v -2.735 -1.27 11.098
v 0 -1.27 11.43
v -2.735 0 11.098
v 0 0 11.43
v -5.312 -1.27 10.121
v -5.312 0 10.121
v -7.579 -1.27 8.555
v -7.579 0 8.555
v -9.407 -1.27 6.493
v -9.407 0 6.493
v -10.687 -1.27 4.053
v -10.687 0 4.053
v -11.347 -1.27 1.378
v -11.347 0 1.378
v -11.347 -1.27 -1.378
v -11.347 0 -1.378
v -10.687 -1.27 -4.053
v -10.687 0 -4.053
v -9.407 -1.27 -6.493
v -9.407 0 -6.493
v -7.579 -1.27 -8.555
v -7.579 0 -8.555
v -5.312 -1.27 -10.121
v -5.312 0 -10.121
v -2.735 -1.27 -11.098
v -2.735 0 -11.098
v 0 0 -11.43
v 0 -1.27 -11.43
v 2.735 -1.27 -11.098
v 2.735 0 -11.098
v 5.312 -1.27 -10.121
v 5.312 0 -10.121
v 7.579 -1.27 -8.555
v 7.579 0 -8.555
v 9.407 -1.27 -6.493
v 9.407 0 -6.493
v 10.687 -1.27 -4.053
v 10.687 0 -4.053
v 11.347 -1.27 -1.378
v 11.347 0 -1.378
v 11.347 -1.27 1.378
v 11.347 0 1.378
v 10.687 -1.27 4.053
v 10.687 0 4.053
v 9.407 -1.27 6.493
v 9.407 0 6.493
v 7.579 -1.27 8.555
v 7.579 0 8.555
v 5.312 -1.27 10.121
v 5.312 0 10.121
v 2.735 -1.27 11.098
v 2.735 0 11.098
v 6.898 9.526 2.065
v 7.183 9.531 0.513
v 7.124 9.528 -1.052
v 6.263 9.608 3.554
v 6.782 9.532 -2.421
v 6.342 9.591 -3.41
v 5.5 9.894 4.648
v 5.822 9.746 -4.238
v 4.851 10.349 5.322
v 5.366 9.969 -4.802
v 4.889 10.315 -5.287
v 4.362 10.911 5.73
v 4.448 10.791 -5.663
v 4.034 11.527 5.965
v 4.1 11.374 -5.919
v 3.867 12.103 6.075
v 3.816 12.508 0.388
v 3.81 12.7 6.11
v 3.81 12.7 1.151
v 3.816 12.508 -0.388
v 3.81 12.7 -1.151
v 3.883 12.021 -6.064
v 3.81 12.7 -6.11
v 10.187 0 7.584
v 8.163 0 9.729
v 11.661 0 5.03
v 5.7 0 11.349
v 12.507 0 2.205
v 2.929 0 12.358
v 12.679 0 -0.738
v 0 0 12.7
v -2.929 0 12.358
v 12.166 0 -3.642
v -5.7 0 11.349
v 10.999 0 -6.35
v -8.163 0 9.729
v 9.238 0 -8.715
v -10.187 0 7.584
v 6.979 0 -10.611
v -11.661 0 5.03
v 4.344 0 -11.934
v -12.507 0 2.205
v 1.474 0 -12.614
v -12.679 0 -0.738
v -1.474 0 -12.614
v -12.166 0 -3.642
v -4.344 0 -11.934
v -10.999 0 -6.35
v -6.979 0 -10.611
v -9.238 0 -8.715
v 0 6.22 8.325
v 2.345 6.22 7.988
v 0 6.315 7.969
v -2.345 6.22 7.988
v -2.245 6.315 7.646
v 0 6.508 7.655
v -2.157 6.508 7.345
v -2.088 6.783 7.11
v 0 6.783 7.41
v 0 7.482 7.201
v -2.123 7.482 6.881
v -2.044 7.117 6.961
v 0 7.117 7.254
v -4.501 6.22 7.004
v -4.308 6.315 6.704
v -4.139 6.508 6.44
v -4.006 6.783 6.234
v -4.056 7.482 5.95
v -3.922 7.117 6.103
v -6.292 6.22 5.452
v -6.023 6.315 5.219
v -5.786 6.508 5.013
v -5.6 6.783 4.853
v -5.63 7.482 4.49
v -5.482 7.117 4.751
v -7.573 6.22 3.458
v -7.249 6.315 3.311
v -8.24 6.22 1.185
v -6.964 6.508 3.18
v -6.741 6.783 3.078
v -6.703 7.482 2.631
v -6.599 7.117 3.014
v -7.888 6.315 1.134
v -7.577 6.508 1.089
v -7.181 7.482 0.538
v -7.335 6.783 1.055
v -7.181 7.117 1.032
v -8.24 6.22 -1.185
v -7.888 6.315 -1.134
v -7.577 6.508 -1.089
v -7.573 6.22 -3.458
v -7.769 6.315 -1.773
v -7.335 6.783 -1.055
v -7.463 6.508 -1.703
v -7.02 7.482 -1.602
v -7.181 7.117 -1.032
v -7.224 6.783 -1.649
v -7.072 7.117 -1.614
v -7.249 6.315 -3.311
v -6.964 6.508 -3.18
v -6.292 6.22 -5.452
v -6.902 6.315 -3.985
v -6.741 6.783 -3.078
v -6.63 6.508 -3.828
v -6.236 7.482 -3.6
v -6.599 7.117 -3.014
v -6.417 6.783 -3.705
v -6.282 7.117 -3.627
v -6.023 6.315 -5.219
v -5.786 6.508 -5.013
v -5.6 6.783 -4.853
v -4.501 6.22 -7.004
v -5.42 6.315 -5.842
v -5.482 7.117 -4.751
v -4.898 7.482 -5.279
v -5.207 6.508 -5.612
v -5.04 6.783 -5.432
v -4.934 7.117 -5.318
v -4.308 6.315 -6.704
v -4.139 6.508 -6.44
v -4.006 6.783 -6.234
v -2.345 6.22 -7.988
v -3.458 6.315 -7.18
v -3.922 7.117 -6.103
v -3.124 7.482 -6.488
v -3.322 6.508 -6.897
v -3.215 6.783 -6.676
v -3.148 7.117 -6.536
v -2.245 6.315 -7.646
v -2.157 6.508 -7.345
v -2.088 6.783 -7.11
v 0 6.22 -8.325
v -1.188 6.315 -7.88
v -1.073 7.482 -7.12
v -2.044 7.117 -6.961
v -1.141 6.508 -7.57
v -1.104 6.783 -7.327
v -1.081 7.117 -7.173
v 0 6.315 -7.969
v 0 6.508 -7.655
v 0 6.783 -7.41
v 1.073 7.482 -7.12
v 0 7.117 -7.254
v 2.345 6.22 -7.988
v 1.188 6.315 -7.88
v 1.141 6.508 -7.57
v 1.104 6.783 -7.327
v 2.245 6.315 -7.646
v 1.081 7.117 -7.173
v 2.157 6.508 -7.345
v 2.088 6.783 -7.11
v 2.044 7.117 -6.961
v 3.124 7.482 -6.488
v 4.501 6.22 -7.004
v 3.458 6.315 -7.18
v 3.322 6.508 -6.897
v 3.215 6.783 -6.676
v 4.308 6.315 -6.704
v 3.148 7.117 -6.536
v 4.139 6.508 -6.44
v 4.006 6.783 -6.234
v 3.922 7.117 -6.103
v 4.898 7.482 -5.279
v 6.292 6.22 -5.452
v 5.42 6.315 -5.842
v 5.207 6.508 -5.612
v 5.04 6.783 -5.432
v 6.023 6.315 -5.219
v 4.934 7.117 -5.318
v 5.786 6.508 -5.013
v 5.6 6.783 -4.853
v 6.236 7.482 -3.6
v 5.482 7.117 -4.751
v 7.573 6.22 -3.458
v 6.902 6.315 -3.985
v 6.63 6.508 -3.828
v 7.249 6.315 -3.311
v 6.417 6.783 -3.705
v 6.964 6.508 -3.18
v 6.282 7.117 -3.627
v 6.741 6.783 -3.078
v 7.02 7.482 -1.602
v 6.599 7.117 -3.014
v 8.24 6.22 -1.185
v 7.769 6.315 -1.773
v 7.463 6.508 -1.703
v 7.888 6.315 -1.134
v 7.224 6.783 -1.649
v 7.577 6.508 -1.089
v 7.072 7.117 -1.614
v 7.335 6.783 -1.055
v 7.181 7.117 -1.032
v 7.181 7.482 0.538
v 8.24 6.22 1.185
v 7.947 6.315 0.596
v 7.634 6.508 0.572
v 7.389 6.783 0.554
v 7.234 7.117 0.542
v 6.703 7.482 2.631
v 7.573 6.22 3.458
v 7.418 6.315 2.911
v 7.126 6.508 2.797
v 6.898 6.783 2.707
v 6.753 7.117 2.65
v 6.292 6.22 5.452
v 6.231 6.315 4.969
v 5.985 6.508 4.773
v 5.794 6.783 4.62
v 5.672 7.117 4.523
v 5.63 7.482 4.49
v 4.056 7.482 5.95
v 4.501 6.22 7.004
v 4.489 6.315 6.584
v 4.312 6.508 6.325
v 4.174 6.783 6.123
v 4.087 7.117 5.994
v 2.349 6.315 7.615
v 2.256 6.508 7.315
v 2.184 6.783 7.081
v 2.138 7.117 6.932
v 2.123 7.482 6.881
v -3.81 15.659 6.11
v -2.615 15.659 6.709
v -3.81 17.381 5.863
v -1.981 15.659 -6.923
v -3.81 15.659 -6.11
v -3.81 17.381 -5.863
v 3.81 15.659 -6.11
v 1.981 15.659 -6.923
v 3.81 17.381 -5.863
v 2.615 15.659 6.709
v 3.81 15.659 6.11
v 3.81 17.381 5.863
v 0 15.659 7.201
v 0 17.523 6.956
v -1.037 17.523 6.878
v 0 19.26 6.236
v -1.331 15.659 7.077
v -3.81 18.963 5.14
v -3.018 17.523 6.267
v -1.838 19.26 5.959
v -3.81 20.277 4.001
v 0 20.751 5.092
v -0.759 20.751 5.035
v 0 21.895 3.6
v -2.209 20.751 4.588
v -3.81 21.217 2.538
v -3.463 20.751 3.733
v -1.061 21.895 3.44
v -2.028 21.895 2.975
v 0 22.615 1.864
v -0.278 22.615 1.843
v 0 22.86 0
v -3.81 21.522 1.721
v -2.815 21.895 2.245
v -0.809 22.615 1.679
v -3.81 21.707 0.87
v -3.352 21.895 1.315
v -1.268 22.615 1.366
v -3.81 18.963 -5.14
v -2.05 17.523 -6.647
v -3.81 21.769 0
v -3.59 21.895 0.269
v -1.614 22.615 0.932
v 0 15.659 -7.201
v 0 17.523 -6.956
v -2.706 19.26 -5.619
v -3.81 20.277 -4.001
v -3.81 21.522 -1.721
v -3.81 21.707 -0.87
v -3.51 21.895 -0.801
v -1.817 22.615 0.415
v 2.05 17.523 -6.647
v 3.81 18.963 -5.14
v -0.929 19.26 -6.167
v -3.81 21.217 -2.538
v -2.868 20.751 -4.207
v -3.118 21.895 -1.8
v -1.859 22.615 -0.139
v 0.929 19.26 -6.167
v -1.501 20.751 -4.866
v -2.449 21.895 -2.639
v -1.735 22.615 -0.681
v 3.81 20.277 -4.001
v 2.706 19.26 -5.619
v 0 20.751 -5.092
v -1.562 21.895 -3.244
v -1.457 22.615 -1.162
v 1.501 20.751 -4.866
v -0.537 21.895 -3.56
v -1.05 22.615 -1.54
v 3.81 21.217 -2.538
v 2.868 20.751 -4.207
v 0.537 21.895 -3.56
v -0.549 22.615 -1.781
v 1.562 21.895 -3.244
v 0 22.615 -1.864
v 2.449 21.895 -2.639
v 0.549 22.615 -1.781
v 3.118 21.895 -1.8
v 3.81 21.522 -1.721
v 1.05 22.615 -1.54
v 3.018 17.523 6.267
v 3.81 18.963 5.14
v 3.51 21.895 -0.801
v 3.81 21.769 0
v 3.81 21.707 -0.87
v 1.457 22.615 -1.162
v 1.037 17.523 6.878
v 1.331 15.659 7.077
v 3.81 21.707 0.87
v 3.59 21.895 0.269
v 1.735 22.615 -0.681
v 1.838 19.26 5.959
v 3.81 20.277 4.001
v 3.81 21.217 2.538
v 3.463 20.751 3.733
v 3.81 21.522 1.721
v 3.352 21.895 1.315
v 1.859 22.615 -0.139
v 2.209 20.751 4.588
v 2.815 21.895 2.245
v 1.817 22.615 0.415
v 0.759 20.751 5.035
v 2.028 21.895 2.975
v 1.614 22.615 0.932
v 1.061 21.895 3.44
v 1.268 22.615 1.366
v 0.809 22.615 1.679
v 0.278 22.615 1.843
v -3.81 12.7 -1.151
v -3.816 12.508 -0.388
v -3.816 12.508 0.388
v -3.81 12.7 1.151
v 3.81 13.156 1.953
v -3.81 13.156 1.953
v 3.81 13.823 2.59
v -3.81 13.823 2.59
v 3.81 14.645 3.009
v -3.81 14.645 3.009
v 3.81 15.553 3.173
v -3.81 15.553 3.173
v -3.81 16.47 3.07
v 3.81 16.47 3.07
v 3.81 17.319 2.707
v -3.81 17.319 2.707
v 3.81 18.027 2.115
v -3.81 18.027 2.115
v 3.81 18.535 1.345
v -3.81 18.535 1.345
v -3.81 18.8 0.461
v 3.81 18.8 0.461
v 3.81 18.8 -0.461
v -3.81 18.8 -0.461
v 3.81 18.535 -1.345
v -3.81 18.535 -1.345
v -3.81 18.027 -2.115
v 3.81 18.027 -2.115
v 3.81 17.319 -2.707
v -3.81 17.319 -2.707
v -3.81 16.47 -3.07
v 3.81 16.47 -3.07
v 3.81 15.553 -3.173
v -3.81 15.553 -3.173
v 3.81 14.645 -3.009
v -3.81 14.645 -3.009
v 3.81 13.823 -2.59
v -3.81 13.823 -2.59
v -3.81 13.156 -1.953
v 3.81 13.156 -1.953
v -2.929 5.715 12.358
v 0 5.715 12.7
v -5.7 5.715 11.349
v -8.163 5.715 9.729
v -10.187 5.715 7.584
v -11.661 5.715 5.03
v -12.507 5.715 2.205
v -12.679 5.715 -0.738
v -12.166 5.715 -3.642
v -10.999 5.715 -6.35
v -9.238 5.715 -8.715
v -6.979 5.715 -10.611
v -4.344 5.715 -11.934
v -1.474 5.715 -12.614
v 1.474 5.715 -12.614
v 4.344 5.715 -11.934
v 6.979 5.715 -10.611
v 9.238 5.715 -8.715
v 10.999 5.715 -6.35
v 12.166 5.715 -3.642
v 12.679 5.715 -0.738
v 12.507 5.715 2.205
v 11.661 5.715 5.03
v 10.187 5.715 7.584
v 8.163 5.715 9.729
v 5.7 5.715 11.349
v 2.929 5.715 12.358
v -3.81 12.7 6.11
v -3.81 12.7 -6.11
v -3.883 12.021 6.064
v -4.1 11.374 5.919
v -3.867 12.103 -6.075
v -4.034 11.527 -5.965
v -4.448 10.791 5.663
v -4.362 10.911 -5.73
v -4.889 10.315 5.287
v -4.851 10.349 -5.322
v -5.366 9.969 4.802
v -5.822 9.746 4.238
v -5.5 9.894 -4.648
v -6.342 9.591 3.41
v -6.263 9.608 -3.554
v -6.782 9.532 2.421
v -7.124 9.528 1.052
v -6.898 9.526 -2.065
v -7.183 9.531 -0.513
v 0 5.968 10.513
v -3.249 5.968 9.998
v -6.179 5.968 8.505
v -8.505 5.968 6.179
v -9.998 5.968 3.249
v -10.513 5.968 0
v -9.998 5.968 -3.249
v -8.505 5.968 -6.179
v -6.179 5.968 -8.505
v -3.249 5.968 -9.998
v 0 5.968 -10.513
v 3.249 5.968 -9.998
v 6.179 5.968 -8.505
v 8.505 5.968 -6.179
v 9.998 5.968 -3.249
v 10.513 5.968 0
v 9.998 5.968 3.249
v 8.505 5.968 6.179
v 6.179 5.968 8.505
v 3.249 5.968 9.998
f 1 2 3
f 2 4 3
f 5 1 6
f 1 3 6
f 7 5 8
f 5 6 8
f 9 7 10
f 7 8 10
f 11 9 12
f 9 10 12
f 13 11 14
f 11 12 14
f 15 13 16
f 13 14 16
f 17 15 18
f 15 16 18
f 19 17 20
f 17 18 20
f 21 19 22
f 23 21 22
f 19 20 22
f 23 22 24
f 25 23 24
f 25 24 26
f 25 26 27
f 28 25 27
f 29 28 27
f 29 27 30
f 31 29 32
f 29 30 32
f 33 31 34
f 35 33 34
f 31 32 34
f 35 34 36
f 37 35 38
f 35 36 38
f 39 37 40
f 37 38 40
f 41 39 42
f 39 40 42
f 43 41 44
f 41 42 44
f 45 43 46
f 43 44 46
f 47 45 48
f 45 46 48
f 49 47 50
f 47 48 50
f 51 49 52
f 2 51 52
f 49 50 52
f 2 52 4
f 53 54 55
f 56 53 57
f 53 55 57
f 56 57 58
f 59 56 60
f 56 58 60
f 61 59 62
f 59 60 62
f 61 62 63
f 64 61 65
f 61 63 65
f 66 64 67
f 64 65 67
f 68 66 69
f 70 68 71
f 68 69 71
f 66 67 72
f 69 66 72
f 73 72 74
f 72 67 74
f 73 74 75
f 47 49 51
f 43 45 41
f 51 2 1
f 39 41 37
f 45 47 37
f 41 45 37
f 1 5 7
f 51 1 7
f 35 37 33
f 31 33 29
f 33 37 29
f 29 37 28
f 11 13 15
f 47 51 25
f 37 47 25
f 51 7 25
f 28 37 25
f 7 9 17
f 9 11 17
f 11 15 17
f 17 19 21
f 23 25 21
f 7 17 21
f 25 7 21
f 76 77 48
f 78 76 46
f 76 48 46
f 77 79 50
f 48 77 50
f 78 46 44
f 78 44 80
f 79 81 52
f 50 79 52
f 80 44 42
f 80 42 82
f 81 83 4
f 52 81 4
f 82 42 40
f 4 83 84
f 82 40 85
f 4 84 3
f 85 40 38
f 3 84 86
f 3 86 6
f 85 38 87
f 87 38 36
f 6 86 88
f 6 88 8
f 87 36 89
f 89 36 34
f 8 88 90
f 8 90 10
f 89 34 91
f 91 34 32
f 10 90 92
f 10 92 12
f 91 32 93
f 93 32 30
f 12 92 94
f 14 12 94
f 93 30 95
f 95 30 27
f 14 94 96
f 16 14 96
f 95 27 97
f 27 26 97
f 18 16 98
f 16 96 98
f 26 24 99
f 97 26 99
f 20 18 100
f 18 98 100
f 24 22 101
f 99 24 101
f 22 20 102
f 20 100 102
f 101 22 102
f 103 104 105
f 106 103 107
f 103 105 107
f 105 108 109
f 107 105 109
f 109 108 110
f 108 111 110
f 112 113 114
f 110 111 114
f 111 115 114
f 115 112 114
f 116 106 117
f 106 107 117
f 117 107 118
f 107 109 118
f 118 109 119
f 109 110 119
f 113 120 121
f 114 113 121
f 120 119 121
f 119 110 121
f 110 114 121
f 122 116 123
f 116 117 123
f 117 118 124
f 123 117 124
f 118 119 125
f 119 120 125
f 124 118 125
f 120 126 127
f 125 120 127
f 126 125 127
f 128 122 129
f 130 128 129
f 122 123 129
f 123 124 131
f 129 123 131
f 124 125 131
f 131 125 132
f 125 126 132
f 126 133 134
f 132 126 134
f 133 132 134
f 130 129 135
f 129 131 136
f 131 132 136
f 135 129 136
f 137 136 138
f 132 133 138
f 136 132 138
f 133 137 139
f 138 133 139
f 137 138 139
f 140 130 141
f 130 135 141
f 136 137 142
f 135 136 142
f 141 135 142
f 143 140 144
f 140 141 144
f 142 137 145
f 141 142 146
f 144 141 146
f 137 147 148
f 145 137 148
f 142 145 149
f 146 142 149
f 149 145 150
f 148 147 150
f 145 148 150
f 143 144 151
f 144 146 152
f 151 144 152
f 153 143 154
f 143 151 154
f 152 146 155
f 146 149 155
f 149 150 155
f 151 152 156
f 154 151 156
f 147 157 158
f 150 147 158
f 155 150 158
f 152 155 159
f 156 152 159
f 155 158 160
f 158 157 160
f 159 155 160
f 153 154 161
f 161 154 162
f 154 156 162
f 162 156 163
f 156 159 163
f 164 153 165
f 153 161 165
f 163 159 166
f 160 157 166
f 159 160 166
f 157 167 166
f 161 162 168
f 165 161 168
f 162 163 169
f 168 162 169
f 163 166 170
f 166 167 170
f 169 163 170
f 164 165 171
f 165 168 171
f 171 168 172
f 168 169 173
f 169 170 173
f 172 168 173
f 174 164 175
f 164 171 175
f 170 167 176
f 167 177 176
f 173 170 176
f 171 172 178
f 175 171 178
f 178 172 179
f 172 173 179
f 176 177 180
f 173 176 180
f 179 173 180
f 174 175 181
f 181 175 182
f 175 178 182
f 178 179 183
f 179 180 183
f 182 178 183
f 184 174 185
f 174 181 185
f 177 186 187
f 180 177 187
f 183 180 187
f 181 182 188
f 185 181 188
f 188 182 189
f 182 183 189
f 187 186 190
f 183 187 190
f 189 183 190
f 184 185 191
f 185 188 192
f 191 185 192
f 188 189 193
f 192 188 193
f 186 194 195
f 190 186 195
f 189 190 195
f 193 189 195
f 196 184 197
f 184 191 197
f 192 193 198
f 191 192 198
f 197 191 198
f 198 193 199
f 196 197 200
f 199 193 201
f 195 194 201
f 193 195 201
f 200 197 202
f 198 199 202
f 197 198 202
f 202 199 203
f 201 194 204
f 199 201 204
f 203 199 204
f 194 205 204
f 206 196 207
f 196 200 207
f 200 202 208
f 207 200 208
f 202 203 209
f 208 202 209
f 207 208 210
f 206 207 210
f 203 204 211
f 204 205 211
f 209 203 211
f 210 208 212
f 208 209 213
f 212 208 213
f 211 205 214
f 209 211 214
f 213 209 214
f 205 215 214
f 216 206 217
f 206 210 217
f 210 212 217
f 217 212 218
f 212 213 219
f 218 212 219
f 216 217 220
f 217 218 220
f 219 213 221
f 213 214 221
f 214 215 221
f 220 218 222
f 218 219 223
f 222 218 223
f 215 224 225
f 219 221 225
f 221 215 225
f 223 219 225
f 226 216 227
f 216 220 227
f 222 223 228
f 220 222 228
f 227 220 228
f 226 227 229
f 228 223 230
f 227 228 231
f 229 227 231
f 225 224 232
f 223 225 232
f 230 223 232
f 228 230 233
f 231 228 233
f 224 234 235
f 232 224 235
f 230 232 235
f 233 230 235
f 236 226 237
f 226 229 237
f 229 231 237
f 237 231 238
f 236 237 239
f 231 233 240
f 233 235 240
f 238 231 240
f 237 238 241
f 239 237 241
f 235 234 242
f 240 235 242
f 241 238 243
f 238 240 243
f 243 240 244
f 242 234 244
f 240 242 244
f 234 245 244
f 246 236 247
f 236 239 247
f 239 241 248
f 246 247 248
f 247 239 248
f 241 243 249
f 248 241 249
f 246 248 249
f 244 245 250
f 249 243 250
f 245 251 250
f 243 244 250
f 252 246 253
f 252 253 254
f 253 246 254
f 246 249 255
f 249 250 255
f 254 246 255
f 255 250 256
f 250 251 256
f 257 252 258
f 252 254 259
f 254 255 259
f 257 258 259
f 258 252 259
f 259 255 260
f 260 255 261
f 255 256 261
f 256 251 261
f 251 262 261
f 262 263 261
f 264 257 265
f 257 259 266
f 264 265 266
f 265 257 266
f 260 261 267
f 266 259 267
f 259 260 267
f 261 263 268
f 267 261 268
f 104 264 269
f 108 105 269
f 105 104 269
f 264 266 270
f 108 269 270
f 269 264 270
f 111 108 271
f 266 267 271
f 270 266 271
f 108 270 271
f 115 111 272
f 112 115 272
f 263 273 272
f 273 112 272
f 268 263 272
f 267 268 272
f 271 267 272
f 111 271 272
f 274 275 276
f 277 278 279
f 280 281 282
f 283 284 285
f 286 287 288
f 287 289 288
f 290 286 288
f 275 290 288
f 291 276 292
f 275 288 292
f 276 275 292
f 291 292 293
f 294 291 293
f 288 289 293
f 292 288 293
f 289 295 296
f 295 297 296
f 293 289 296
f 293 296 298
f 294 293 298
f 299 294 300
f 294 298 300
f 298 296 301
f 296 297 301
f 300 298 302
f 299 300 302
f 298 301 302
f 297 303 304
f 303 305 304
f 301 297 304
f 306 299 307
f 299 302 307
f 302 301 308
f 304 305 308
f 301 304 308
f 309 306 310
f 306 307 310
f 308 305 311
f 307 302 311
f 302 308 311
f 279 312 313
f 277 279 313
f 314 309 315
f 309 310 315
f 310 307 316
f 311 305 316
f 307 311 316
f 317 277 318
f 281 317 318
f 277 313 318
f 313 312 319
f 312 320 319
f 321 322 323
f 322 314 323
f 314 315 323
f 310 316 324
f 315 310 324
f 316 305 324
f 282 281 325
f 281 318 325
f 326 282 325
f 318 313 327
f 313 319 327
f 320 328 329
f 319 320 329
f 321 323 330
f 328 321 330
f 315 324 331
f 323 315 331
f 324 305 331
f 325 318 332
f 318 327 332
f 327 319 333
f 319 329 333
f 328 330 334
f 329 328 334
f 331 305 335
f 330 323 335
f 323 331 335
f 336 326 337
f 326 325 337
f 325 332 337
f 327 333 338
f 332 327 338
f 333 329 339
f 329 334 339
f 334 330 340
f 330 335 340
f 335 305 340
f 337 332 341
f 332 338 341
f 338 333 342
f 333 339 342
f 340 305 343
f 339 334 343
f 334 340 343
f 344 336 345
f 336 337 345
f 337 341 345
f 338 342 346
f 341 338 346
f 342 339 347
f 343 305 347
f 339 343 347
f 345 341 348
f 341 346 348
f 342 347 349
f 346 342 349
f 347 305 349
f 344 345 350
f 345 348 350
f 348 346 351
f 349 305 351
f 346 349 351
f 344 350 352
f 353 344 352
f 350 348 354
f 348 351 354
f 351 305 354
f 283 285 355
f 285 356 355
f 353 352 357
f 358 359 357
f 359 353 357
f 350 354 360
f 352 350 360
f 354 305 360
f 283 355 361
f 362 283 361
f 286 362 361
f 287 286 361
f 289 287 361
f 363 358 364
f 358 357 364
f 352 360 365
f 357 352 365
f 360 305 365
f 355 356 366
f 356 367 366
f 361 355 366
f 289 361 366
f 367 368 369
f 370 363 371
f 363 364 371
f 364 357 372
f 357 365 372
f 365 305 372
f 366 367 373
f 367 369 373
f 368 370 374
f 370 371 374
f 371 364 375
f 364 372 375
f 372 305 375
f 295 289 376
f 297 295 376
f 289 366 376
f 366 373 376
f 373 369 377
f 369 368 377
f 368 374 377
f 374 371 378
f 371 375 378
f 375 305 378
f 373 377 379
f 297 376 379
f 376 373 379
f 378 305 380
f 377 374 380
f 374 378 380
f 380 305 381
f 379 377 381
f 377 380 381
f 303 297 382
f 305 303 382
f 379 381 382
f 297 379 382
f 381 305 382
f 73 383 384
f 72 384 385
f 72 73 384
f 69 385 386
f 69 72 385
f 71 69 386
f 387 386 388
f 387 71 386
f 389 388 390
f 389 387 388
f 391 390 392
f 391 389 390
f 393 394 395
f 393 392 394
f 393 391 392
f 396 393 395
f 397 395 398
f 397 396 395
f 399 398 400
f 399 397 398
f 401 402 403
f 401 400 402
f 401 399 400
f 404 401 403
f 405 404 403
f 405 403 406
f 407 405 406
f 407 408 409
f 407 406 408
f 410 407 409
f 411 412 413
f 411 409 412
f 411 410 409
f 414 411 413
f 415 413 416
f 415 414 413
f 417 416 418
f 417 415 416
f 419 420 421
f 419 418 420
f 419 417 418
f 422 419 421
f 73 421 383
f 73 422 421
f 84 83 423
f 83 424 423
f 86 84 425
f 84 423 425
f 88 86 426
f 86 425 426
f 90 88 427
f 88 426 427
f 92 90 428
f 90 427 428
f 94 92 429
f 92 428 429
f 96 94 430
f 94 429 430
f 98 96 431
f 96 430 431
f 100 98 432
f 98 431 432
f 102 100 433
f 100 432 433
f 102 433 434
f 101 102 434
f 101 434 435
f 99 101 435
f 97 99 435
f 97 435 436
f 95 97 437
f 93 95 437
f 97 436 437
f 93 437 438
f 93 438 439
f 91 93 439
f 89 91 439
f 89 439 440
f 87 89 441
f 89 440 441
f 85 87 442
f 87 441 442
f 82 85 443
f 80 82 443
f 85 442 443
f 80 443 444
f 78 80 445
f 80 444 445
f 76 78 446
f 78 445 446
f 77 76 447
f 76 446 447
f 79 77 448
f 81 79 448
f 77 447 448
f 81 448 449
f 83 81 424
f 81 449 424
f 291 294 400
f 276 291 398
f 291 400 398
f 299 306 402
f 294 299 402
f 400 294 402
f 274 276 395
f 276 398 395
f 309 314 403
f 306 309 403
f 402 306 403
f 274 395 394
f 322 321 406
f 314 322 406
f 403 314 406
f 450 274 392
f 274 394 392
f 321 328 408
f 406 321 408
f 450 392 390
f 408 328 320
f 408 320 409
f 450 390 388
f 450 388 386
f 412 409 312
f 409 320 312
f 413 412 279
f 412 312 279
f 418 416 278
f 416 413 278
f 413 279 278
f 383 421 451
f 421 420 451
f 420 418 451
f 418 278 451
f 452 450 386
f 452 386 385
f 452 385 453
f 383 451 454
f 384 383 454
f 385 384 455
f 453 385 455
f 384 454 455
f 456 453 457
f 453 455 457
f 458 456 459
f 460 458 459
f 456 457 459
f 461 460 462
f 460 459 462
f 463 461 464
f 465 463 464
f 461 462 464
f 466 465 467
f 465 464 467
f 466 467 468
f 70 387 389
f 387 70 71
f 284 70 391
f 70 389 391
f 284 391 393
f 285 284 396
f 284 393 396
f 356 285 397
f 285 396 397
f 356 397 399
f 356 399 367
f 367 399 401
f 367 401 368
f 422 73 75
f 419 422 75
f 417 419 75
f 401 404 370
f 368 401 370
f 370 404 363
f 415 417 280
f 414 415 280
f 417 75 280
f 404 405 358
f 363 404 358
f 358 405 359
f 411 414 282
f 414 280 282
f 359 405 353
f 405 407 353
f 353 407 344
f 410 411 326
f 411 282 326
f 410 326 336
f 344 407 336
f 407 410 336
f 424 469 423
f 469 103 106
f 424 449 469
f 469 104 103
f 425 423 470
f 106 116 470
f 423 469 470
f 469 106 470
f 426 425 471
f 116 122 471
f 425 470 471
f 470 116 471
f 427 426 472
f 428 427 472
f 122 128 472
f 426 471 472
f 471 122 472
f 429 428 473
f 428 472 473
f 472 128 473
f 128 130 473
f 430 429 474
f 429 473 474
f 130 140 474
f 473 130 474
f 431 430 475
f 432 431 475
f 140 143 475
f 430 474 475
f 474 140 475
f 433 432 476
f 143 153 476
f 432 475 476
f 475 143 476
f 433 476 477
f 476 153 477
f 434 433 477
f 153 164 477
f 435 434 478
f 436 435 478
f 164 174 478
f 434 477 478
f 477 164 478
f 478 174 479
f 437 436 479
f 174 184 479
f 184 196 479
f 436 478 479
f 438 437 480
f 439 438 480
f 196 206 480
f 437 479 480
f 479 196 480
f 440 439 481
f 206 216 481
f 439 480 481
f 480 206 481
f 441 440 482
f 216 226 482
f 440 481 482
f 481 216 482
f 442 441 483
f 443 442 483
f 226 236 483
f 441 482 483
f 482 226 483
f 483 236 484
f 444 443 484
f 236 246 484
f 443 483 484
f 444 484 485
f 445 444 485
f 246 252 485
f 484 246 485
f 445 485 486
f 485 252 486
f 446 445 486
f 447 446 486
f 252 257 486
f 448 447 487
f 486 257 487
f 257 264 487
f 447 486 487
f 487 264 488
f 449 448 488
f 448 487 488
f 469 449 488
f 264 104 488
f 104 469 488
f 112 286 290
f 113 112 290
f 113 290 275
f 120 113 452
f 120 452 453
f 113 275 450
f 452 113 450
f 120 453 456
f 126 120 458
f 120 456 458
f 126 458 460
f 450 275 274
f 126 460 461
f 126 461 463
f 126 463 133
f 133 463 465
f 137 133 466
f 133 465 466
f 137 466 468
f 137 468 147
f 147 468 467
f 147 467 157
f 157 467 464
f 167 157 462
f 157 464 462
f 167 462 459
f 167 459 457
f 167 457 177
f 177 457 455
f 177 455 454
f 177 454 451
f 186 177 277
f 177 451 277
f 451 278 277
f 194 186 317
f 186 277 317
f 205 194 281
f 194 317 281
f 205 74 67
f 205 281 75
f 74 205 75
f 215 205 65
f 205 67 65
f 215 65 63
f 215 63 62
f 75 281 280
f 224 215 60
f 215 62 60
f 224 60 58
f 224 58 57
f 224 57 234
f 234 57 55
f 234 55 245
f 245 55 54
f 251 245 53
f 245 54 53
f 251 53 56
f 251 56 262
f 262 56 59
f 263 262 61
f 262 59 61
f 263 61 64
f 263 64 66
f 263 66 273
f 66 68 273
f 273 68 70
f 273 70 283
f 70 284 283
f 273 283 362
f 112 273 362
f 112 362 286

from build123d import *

# Parameters (mm, degrees)
CUT_EXTRUDE1_DEPTH      = 30.071628781
CUT_EXTRUDE1_DEPTH_BACK = 30.071628781
CUT_EXTRUDE2_DEPTH      = 31.926520981
CUT_EXTRUDE2_DEPTH_BACK = 31.926520981
SKETCH4_R               = 3.175


with BuildPart() as part:
    # Sketch1 → Revolve1 (revolve)
    with BuildSketch(Plane.XY, mode=Mode.PRIVATE) as revolve1_sk:
        with BuildLine():
            Line((-12.7, 0), (-12.7, 5.715))
            Line((-12.7, 5.715), (-8.325216792, 6.220171271))
            ThreePointArc((-8.325216792, 6.220171271), (-7.522765602, 6.636837464), (-7.2009, 7.481787854))
            Line((-7.2009, 7.481787854), (-7.2009, 15.6591))
            ThreePointArc((-7.2009, 15.6591), (-5.091805221, 20.750905221), (0, 22.86))
            Line((0, 22.86), (0, 6.35))
            Line((0, 6.35), (0, 0))
            Line((0, 0), (0, -1.27))
            Line((0, -1.27), (-11.43, -1.27))
            Line((-11.43, -1.27), (-11.43, 0))
            Line((-11.43, 0), (-12.7, 0))
        make_face()
    revolve(revolve1_sk.sketch.rotate(Axis((0, 6.35, 0), (0, -1, 0)), 270), axis=Axis((0, 6.35, 0), (0, -1, 0)))

    # Sketch3 → Cut-Extrude1 (cut, two sides: drawn at the far end of the back side and taken through both)
    with BuildSketch(Plane.XY.offset(-CUT_EXTRUDE1_DEPTH_BACK)):
        with BuildLine():
            Line((-3.81, 22.86), (-3.81, 12.7))
            ThreePointArc((-3.81, 12.7), (-6.985, 9.525), (-10.16, 12.7))
            Line((-10.16, 12.7), (-10.16, 22.86))
            Line((-10.16, 22.86), (-3.81, 22.86))
        make_face()
        with BuildLine():
            Line((10.16, 22.86), (10.16, 12.7))
            ThreePointArc((10.16, 12.7), (6.985, 9.525), (3.81, 12.7))
            Line((3.81, 12.7), (3.81, 22.86))
            Line((3.81, 22.86), (10.16, 22.86))
        make_face()
    extrude(amount=CUT_EXTRUDE1_DEPTH + CUT_EXTRUDE1_DEPTH_BACK, mode=Mode.SUBTRACT)

    # Sketch4 → Cut-Extrude2 (cut, two sides: drawn at the far end of the back side and taken through both)
    with BuildSketch(Plane.ZY.offset(3.81).offset(-CUT_EXTRUDE2_DEPTH_BACK)):
        with Locations(Location((0, 15.6591, 0), (0, 0, 248.748756024))):
            Circle(SKETCH4_R)
    extrude(amount=CUT_EXTRUDE2_DEPTH + CUT_EXTRUDE2_DEPTH_BACK, mode=Mode.SUBTRACT)


solid = part.part
